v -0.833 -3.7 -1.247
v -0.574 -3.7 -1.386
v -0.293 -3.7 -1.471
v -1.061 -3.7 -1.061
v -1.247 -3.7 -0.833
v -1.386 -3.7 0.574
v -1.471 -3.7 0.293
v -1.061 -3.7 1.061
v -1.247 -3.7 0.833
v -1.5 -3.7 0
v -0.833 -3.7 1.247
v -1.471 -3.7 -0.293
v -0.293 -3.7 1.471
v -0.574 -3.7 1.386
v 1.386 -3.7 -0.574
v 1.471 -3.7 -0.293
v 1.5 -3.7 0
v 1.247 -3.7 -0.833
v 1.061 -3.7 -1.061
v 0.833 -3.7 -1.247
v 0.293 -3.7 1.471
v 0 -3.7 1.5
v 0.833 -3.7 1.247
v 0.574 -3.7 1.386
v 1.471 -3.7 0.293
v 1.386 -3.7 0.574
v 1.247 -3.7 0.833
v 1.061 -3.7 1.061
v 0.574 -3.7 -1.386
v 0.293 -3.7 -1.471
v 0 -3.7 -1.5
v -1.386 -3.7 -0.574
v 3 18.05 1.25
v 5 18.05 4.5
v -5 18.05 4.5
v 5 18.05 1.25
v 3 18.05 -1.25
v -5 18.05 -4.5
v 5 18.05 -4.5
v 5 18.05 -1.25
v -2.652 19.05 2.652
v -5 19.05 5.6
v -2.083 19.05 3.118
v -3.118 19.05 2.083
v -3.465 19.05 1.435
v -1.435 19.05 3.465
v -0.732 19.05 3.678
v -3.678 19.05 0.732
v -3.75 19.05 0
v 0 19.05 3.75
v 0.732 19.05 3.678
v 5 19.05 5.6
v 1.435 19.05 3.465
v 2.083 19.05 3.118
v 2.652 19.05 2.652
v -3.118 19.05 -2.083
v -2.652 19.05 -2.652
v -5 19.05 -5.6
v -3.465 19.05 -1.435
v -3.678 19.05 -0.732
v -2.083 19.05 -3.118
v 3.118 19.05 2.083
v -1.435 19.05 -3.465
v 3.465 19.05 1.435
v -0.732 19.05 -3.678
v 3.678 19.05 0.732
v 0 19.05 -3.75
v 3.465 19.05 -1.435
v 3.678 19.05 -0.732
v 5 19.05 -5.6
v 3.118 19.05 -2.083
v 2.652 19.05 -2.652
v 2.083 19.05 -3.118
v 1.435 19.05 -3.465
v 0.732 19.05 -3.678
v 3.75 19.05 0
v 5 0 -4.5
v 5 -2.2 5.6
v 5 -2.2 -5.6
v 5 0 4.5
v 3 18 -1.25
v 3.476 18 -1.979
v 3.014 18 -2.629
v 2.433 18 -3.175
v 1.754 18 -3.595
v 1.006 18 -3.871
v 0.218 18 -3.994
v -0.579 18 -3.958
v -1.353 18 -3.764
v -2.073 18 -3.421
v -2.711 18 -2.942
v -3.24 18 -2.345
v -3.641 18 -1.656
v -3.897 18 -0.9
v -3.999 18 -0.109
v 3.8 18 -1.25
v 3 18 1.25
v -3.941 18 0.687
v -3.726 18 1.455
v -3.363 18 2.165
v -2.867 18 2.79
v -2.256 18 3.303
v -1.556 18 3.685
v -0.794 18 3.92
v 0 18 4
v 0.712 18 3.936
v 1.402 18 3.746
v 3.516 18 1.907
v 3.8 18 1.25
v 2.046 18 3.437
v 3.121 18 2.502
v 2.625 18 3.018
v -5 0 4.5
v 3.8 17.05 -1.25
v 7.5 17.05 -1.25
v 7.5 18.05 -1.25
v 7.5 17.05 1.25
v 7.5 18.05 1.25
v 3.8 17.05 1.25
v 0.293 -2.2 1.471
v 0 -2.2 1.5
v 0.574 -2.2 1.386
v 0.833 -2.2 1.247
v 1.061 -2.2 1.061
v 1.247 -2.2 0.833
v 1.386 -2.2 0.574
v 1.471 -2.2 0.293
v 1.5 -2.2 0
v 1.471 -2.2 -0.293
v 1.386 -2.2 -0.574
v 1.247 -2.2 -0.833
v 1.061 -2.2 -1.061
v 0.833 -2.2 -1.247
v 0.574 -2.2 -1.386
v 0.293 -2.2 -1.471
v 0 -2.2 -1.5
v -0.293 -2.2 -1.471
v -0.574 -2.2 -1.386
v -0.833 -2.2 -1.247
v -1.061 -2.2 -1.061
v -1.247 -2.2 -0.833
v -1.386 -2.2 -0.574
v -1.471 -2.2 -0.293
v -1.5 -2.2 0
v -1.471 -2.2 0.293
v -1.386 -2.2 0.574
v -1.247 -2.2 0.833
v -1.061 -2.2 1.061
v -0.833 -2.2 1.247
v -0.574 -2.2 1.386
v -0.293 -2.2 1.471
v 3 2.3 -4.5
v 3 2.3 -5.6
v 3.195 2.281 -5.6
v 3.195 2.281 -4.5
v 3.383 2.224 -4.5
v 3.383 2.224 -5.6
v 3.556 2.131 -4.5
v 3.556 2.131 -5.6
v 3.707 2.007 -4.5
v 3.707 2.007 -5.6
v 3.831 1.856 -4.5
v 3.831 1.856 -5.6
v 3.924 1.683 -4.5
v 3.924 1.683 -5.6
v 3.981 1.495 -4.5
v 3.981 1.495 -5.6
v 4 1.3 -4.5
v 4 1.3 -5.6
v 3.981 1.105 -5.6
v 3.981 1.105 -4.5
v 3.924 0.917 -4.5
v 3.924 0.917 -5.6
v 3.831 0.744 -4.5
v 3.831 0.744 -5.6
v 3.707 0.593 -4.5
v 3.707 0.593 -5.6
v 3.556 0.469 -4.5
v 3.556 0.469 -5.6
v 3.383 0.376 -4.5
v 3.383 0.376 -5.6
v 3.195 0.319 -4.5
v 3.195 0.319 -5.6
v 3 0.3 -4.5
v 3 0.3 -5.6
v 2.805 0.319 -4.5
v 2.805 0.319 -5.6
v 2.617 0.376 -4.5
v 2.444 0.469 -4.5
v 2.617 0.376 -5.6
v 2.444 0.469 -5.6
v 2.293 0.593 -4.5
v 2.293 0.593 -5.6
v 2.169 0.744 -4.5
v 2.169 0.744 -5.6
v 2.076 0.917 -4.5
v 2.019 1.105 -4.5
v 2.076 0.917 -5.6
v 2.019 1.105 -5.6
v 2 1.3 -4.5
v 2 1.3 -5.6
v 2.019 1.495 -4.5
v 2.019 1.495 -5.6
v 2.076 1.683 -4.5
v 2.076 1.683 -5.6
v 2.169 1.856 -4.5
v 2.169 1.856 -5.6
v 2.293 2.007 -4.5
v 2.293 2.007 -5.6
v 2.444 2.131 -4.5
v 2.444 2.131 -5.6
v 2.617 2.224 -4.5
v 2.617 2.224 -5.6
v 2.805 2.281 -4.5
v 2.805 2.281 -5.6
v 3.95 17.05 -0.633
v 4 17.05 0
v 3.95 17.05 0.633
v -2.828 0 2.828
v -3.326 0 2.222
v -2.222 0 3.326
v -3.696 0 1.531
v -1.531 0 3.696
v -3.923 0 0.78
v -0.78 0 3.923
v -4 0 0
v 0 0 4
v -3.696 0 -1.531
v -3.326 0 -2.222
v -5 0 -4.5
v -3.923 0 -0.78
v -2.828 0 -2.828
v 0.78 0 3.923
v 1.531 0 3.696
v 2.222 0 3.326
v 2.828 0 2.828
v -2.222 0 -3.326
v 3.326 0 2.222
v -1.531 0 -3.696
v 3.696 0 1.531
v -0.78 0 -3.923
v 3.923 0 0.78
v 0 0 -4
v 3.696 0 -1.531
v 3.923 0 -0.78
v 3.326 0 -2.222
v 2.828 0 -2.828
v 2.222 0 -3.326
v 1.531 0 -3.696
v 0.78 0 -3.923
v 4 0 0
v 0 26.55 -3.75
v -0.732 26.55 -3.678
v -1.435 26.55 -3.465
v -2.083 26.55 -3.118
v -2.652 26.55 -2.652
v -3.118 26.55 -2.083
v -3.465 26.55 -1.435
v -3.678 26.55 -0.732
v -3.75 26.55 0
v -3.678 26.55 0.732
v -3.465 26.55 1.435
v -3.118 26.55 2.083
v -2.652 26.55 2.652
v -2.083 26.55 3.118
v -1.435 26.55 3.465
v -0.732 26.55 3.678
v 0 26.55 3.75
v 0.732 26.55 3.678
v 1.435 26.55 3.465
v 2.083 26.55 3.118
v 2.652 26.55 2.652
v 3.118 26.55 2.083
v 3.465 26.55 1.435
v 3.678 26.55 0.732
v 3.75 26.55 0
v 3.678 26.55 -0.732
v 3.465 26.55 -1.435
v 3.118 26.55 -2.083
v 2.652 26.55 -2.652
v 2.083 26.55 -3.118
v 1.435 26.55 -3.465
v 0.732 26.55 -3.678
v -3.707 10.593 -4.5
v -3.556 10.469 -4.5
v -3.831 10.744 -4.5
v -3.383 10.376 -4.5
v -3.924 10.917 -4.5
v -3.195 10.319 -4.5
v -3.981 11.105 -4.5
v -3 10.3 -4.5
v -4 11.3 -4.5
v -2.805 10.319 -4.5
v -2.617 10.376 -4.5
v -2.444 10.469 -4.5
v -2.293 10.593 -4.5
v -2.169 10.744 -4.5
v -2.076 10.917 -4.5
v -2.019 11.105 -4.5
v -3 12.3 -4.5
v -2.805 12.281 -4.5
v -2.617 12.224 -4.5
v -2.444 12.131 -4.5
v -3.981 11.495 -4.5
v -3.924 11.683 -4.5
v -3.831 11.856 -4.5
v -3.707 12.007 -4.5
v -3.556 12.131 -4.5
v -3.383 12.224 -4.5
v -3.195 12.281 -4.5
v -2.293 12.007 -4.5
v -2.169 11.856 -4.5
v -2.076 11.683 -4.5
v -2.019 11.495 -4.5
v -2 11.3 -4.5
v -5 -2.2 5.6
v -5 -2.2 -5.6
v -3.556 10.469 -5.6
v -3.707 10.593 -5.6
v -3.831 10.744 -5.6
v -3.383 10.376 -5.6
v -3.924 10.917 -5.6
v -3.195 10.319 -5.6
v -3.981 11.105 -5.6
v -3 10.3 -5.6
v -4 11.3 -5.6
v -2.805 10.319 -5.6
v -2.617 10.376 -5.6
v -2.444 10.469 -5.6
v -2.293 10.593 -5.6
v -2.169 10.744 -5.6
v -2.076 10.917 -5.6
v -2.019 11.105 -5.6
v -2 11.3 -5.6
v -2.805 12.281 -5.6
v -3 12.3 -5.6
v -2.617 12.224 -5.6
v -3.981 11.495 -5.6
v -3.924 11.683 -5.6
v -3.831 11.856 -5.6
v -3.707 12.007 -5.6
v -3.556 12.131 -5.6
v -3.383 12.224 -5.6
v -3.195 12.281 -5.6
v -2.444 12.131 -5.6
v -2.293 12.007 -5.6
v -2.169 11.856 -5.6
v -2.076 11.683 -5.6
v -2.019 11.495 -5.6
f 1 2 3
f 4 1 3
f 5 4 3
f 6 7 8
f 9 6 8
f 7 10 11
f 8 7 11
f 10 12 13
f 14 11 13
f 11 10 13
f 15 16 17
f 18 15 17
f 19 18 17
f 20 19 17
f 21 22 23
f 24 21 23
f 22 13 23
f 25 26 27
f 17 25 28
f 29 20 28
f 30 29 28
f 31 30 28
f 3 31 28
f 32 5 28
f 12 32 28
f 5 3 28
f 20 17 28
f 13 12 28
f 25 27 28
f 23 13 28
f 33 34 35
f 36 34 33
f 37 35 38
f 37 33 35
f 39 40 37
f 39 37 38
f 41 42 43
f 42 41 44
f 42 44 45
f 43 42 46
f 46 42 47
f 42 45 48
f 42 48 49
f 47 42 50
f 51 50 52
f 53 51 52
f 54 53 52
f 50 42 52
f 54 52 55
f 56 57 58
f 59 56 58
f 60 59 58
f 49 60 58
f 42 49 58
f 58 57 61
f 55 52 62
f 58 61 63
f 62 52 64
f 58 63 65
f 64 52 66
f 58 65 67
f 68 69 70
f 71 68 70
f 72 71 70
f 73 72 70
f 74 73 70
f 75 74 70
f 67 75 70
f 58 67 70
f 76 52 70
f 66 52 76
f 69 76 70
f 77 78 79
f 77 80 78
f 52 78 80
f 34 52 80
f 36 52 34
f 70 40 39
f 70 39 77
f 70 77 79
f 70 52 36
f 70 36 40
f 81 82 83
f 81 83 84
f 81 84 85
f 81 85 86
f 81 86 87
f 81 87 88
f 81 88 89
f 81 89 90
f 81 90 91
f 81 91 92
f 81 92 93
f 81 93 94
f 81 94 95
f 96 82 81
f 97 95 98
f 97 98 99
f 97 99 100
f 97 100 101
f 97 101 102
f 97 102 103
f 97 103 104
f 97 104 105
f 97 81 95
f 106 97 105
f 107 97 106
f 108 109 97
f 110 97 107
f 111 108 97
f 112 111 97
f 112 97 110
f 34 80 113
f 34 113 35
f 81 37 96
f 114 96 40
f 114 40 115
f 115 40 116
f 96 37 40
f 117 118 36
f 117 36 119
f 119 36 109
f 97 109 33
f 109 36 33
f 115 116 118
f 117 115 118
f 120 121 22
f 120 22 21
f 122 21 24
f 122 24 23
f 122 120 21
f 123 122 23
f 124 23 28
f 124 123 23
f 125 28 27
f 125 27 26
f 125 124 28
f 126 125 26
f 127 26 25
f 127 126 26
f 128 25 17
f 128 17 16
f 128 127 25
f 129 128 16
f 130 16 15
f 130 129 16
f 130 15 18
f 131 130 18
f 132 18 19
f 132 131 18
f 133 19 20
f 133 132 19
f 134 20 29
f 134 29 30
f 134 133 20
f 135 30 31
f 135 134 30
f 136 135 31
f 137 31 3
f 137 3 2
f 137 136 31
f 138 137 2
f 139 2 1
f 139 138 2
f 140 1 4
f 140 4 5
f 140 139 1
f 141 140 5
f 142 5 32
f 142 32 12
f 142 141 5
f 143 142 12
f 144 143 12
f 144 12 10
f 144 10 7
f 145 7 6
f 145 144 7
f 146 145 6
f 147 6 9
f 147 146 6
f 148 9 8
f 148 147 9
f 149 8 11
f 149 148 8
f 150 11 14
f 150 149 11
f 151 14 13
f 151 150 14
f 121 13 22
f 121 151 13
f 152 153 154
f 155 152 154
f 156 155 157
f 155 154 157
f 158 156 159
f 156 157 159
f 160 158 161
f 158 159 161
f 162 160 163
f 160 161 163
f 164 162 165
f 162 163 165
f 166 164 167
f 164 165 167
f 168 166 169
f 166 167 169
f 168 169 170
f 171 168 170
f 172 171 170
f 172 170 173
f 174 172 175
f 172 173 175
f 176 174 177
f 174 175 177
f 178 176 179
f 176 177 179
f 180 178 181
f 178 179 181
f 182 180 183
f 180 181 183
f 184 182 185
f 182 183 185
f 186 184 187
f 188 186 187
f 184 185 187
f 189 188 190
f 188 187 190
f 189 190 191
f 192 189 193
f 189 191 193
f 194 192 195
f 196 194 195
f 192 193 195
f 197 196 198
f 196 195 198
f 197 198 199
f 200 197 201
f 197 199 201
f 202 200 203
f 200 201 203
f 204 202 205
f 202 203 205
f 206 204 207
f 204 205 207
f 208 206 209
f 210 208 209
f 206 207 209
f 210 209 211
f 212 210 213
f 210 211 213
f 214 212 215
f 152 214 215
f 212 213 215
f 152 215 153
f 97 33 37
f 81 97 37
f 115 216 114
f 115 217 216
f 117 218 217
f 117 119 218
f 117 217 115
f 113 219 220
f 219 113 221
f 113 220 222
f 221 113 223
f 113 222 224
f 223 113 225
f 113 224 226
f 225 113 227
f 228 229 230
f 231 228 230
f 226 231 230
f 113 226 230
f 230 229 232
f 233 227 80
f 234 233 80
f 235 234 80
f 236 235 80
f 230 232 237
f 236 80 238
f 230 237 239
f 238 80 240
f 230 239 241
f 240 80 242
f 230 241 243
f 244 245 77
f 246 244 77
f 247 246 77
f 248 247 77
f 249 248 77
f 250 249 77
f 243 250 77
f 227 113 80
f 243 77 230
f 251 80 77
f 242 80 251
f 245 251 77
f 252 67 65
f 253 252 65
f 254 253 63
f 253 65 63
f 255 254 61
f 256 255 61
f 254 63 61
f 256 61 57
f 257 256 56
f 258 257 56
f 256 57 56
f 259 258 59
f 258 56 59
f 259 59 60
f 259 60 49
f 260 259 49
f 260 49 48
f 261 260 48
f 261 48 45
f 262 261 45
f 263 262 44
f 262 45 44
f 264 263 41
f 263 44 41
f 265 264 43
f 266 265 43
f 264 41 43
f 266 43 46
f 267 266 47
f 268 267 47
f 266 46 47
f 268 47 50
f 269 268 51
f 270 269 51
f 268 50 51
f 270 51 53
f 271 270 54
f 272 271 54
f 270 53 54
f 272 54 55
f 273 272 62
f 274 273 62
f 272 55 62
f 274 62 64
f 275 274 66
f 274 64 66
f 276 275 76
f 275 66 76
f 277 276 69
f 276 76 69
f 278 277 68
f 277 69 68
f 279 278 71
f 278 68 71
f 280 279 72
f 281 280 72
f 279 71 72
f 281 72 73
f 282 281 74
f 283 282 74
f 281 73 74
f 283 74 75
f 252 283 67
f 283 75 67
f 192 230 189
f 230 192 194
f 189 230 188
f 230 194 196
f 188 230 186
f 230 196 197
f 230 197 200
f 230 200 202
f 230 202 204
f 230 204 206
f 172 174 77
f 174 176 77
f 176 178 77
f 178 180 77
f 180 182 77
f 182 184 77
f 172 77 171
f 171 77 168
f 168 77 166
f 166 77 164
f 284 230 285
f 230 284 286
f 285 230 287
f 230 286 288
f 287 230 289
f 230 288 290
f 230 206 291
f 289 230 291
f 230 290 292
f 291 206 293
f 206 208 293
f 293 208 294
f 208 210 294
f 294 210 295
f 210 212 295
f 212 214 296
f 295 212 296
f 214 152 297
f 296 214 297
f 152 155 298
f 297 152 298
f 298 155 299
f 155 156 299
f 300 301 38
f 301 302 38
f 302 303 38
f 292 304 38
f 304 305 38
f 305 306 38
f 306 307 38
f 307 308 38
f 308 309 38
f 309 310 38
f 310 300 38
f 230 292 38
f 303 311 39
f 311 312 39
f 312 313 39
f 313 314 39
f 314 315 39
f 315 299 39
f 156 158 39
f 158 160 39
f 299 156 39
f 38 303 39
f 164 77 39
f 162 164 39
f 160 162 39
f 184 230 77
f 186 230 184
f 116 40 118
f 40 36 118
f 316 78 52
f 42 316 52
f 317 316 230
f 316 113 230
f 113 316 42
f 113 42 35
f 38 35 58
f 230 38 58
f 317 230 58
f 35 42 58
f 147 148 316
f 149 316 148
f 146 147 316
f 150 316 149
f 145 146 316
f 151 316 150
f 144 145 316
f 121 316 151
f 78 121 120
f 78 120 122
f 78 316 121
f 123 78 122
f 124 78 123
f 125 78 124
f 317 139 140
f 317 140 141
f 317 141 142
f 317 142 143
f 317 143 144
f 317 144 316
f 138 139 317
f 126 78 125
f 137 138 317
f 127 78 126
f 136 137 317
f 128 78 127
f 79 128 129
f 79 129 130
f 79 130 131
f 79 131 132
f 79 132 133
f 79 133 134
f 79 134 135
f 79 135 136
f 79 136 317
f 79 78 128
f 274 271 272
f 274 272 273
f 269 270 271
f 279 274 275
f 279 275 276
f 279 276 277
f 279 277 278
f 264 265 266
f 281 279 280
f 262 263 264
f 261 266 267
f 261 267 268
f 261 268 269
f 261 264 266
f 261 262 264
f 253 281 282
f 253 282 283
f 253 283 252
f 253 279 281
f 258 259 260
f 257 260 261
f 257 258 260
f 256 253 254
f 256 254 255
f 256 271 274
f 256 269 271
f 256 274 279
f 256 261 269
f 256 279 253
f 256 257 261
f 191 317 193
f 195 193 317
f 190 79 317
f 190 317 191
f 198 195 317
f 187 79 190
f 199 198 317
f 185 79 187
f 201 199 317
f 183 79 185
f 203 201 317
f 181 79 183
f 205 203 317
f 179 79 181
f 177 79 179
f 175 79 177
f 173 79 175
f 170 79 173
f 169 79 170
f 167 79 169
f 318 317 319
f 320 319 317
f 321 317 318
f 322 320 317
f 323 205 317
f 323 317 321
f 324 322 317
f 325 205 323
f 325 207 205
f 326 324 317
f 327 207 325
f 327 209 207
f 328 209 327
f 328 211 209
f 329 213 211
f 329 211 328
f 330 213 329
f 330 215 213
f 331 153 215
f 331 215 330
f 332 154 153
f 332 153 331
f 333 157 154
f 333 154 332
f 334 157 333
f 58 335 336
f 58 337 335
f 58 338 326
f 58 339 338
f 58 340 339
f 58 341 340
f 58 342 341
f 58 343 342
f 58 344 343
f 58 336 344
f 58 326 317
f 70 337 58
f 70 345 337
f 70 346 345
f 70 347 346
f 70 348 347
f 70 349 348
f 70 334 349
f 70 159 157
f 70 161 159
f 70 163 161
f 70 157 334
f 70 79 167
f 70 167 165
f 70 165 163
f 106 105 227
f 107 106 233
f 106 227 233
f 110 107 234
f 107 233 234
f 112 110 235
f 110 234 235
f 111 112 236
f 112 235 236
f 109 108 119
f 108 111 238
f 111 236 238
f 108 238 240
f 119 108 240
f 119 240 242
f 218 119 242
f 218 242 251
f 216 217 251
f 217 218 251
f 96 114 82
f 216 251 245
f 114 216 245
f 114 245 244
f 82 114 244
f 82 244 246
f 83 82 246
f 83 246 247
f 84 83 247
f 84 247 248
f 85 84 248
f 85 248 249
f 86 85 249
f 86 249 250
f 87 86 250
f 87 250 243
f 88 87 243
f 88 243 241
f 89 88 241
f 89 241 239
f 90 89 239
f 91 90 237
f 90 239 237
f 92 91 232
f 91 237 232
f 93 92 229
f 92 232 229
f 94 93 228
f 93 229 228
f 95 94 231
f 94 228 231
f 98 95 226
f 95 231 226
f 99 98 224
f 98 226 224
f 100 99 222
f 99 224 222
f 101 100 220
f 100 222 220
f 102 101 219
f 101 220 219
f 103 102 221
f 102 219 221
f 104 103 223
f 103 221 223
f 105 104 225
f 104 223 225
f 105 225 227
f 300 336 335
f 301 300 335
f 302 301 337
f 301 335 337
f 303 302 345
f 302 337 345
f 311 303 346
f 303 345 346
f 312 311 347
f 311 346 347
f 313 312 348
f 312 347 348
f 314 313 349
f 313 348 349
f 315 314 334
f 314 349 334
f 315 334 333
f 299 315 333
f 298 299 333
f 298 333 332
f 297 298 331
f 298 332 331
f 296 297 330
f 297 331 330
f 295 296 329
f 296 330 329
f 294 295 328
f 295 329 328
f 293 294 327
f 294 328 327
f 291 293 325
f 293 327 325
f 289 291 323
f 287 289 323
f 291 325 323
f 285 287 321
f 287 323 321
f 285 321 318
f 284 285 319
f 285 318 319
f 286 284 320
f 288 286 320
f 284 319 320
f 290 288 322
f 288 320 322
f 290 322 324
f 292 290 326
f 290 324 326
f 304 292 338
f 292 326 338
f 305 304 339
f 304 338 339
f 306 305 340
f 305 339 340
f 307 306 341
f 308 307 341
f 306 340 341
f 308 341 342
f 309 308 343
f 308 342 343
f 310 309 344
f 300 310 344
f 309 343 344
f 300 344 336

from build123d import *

# Parameters (mm, degrees)
SKETCH2_R           = 4
BOSS_EXTRUDE1_DEPTH = 18
SKETCH3_W           = 11.2
SKETCH3_H           = 21.25
SKETCH3_W_2         = 9
SKETCH3_H_2         = 18.05
BOSS_EXTRUDE2_DEPTH = 5
BOSS_EXTRUDE3_START = 19.05
SKETCH4_R           = 3.75
BOSS_EXTRUDE3_DEPTH = 7.5
BOSS_EXTRUDE4_START = -2.2
SKETCH4_3_R         = 1.5
BOSS_EXTRUDE4_DEPTH = 1.5
SKETCH5_R           = 1
CUT_EXTRUDE1_DEPTH  = 1.1
SKETCH6_W           = 2
SKETCH6_H           = 1.25
BOSS_EXTRUDE6_DEPTH = 1


with BuildPart() as part:
    # Sketch2 → Boss-Extrude1 (new body)
    with BuildSketch(Plane(origin=(0, 0, 0), x_dir=(1, 0, 0), z_dir=(0, 1, 0))):
        with Locations(Location((0, 0, 0), (0, 0, 270))):
            Circle(SKETCH2_R)
    extrude(amount=BOSS_EXTRUDE1_DEPTH)

    # Sketch3 → Boss-Extrude2 (add, symmetric)
    with BuildSketch(Plane(origin=(0, 0, 0), x_dir=(0, 0, -1), z_dir=(1, 0, 0))):
        with Locations((0, 8.425)):
            Rectangle(SKETCH3_W, SKETCH3_H)
        with Locations((0, 9.025)):
            Rectangle(SKETCH3_W_2, SKETCH3_H_2, mode=Mode.SUBTRACT)
    extrude(amount=BOSS_EXTRUDE2_DEPTH, both=True)

    # Sketch4 → Boss-Extrude3 (add)
    with BuildSketch(Plane(origin=(0, 0, 0), x_dir=(1, 0, 0), z_dir=(0, 1, 0)).offset(BOSS_EXTRUDE3_START)):
        with Locations(Location((0, 0, 0), (0, 0, 90))):
            Circle(SKETCH4_R)
    extrude(amount=BOSS_EXTRUDE3_DEPTH)

    # Sketch4<3> → Boss-Extrude4 (add)
    with BuildSketch(Plane(origin=(0, 0, 0), x_dir=(1, 0, 0), z_dir=(0, 1, 0)).offset(BOSS_EXTRUDE4_START)):
        with Locations(Location((0, 0, 0), (0, 0, 270))):
            Circle(SKETCH4_3_R)
    extrude(amount=-BOSS_EXTRUDE4_DEPTH)

    # Sketch5 → Cut-Extrude1 (cut)
    with BuildSketch(Plane(origin=(0, 0, -5.6), x_dir=(-1, 0, 0), z_dir=(0, 0, -1))):
        with Locations(Location((-3, 1.3, 0), (0, 0, 90))):
            Circle(SKETCH5_R)
        with Locations(Location((3, 11.3, 0), (0, 0, 90))):
            Circle(SKETCH5_R)
    extrude(amount=-CUT_EXTRUDE1_DEPTH, mode=Mode.SUBTRACT)

    # Sketch6 → Boss-Extrude6 (add)
    with BuildSketch(Plane.XZ.offset(-18.05)):
        Polygon((5, 0), (5, -1.25), (7.5, -1.25), (7.5, 1.25), (5, 1.25), align=None)
        with Locations((4, -0.625)):
            Rectangle(SKETCH6_W, SKETCH6_H)
        with Locations((4, 0.625)):
            Rectangle(SKETCH6_W, SKETCH6_H)
    extrude(amount=BOSS_EXTRUDE6_DEPTH)


solid = part.part
